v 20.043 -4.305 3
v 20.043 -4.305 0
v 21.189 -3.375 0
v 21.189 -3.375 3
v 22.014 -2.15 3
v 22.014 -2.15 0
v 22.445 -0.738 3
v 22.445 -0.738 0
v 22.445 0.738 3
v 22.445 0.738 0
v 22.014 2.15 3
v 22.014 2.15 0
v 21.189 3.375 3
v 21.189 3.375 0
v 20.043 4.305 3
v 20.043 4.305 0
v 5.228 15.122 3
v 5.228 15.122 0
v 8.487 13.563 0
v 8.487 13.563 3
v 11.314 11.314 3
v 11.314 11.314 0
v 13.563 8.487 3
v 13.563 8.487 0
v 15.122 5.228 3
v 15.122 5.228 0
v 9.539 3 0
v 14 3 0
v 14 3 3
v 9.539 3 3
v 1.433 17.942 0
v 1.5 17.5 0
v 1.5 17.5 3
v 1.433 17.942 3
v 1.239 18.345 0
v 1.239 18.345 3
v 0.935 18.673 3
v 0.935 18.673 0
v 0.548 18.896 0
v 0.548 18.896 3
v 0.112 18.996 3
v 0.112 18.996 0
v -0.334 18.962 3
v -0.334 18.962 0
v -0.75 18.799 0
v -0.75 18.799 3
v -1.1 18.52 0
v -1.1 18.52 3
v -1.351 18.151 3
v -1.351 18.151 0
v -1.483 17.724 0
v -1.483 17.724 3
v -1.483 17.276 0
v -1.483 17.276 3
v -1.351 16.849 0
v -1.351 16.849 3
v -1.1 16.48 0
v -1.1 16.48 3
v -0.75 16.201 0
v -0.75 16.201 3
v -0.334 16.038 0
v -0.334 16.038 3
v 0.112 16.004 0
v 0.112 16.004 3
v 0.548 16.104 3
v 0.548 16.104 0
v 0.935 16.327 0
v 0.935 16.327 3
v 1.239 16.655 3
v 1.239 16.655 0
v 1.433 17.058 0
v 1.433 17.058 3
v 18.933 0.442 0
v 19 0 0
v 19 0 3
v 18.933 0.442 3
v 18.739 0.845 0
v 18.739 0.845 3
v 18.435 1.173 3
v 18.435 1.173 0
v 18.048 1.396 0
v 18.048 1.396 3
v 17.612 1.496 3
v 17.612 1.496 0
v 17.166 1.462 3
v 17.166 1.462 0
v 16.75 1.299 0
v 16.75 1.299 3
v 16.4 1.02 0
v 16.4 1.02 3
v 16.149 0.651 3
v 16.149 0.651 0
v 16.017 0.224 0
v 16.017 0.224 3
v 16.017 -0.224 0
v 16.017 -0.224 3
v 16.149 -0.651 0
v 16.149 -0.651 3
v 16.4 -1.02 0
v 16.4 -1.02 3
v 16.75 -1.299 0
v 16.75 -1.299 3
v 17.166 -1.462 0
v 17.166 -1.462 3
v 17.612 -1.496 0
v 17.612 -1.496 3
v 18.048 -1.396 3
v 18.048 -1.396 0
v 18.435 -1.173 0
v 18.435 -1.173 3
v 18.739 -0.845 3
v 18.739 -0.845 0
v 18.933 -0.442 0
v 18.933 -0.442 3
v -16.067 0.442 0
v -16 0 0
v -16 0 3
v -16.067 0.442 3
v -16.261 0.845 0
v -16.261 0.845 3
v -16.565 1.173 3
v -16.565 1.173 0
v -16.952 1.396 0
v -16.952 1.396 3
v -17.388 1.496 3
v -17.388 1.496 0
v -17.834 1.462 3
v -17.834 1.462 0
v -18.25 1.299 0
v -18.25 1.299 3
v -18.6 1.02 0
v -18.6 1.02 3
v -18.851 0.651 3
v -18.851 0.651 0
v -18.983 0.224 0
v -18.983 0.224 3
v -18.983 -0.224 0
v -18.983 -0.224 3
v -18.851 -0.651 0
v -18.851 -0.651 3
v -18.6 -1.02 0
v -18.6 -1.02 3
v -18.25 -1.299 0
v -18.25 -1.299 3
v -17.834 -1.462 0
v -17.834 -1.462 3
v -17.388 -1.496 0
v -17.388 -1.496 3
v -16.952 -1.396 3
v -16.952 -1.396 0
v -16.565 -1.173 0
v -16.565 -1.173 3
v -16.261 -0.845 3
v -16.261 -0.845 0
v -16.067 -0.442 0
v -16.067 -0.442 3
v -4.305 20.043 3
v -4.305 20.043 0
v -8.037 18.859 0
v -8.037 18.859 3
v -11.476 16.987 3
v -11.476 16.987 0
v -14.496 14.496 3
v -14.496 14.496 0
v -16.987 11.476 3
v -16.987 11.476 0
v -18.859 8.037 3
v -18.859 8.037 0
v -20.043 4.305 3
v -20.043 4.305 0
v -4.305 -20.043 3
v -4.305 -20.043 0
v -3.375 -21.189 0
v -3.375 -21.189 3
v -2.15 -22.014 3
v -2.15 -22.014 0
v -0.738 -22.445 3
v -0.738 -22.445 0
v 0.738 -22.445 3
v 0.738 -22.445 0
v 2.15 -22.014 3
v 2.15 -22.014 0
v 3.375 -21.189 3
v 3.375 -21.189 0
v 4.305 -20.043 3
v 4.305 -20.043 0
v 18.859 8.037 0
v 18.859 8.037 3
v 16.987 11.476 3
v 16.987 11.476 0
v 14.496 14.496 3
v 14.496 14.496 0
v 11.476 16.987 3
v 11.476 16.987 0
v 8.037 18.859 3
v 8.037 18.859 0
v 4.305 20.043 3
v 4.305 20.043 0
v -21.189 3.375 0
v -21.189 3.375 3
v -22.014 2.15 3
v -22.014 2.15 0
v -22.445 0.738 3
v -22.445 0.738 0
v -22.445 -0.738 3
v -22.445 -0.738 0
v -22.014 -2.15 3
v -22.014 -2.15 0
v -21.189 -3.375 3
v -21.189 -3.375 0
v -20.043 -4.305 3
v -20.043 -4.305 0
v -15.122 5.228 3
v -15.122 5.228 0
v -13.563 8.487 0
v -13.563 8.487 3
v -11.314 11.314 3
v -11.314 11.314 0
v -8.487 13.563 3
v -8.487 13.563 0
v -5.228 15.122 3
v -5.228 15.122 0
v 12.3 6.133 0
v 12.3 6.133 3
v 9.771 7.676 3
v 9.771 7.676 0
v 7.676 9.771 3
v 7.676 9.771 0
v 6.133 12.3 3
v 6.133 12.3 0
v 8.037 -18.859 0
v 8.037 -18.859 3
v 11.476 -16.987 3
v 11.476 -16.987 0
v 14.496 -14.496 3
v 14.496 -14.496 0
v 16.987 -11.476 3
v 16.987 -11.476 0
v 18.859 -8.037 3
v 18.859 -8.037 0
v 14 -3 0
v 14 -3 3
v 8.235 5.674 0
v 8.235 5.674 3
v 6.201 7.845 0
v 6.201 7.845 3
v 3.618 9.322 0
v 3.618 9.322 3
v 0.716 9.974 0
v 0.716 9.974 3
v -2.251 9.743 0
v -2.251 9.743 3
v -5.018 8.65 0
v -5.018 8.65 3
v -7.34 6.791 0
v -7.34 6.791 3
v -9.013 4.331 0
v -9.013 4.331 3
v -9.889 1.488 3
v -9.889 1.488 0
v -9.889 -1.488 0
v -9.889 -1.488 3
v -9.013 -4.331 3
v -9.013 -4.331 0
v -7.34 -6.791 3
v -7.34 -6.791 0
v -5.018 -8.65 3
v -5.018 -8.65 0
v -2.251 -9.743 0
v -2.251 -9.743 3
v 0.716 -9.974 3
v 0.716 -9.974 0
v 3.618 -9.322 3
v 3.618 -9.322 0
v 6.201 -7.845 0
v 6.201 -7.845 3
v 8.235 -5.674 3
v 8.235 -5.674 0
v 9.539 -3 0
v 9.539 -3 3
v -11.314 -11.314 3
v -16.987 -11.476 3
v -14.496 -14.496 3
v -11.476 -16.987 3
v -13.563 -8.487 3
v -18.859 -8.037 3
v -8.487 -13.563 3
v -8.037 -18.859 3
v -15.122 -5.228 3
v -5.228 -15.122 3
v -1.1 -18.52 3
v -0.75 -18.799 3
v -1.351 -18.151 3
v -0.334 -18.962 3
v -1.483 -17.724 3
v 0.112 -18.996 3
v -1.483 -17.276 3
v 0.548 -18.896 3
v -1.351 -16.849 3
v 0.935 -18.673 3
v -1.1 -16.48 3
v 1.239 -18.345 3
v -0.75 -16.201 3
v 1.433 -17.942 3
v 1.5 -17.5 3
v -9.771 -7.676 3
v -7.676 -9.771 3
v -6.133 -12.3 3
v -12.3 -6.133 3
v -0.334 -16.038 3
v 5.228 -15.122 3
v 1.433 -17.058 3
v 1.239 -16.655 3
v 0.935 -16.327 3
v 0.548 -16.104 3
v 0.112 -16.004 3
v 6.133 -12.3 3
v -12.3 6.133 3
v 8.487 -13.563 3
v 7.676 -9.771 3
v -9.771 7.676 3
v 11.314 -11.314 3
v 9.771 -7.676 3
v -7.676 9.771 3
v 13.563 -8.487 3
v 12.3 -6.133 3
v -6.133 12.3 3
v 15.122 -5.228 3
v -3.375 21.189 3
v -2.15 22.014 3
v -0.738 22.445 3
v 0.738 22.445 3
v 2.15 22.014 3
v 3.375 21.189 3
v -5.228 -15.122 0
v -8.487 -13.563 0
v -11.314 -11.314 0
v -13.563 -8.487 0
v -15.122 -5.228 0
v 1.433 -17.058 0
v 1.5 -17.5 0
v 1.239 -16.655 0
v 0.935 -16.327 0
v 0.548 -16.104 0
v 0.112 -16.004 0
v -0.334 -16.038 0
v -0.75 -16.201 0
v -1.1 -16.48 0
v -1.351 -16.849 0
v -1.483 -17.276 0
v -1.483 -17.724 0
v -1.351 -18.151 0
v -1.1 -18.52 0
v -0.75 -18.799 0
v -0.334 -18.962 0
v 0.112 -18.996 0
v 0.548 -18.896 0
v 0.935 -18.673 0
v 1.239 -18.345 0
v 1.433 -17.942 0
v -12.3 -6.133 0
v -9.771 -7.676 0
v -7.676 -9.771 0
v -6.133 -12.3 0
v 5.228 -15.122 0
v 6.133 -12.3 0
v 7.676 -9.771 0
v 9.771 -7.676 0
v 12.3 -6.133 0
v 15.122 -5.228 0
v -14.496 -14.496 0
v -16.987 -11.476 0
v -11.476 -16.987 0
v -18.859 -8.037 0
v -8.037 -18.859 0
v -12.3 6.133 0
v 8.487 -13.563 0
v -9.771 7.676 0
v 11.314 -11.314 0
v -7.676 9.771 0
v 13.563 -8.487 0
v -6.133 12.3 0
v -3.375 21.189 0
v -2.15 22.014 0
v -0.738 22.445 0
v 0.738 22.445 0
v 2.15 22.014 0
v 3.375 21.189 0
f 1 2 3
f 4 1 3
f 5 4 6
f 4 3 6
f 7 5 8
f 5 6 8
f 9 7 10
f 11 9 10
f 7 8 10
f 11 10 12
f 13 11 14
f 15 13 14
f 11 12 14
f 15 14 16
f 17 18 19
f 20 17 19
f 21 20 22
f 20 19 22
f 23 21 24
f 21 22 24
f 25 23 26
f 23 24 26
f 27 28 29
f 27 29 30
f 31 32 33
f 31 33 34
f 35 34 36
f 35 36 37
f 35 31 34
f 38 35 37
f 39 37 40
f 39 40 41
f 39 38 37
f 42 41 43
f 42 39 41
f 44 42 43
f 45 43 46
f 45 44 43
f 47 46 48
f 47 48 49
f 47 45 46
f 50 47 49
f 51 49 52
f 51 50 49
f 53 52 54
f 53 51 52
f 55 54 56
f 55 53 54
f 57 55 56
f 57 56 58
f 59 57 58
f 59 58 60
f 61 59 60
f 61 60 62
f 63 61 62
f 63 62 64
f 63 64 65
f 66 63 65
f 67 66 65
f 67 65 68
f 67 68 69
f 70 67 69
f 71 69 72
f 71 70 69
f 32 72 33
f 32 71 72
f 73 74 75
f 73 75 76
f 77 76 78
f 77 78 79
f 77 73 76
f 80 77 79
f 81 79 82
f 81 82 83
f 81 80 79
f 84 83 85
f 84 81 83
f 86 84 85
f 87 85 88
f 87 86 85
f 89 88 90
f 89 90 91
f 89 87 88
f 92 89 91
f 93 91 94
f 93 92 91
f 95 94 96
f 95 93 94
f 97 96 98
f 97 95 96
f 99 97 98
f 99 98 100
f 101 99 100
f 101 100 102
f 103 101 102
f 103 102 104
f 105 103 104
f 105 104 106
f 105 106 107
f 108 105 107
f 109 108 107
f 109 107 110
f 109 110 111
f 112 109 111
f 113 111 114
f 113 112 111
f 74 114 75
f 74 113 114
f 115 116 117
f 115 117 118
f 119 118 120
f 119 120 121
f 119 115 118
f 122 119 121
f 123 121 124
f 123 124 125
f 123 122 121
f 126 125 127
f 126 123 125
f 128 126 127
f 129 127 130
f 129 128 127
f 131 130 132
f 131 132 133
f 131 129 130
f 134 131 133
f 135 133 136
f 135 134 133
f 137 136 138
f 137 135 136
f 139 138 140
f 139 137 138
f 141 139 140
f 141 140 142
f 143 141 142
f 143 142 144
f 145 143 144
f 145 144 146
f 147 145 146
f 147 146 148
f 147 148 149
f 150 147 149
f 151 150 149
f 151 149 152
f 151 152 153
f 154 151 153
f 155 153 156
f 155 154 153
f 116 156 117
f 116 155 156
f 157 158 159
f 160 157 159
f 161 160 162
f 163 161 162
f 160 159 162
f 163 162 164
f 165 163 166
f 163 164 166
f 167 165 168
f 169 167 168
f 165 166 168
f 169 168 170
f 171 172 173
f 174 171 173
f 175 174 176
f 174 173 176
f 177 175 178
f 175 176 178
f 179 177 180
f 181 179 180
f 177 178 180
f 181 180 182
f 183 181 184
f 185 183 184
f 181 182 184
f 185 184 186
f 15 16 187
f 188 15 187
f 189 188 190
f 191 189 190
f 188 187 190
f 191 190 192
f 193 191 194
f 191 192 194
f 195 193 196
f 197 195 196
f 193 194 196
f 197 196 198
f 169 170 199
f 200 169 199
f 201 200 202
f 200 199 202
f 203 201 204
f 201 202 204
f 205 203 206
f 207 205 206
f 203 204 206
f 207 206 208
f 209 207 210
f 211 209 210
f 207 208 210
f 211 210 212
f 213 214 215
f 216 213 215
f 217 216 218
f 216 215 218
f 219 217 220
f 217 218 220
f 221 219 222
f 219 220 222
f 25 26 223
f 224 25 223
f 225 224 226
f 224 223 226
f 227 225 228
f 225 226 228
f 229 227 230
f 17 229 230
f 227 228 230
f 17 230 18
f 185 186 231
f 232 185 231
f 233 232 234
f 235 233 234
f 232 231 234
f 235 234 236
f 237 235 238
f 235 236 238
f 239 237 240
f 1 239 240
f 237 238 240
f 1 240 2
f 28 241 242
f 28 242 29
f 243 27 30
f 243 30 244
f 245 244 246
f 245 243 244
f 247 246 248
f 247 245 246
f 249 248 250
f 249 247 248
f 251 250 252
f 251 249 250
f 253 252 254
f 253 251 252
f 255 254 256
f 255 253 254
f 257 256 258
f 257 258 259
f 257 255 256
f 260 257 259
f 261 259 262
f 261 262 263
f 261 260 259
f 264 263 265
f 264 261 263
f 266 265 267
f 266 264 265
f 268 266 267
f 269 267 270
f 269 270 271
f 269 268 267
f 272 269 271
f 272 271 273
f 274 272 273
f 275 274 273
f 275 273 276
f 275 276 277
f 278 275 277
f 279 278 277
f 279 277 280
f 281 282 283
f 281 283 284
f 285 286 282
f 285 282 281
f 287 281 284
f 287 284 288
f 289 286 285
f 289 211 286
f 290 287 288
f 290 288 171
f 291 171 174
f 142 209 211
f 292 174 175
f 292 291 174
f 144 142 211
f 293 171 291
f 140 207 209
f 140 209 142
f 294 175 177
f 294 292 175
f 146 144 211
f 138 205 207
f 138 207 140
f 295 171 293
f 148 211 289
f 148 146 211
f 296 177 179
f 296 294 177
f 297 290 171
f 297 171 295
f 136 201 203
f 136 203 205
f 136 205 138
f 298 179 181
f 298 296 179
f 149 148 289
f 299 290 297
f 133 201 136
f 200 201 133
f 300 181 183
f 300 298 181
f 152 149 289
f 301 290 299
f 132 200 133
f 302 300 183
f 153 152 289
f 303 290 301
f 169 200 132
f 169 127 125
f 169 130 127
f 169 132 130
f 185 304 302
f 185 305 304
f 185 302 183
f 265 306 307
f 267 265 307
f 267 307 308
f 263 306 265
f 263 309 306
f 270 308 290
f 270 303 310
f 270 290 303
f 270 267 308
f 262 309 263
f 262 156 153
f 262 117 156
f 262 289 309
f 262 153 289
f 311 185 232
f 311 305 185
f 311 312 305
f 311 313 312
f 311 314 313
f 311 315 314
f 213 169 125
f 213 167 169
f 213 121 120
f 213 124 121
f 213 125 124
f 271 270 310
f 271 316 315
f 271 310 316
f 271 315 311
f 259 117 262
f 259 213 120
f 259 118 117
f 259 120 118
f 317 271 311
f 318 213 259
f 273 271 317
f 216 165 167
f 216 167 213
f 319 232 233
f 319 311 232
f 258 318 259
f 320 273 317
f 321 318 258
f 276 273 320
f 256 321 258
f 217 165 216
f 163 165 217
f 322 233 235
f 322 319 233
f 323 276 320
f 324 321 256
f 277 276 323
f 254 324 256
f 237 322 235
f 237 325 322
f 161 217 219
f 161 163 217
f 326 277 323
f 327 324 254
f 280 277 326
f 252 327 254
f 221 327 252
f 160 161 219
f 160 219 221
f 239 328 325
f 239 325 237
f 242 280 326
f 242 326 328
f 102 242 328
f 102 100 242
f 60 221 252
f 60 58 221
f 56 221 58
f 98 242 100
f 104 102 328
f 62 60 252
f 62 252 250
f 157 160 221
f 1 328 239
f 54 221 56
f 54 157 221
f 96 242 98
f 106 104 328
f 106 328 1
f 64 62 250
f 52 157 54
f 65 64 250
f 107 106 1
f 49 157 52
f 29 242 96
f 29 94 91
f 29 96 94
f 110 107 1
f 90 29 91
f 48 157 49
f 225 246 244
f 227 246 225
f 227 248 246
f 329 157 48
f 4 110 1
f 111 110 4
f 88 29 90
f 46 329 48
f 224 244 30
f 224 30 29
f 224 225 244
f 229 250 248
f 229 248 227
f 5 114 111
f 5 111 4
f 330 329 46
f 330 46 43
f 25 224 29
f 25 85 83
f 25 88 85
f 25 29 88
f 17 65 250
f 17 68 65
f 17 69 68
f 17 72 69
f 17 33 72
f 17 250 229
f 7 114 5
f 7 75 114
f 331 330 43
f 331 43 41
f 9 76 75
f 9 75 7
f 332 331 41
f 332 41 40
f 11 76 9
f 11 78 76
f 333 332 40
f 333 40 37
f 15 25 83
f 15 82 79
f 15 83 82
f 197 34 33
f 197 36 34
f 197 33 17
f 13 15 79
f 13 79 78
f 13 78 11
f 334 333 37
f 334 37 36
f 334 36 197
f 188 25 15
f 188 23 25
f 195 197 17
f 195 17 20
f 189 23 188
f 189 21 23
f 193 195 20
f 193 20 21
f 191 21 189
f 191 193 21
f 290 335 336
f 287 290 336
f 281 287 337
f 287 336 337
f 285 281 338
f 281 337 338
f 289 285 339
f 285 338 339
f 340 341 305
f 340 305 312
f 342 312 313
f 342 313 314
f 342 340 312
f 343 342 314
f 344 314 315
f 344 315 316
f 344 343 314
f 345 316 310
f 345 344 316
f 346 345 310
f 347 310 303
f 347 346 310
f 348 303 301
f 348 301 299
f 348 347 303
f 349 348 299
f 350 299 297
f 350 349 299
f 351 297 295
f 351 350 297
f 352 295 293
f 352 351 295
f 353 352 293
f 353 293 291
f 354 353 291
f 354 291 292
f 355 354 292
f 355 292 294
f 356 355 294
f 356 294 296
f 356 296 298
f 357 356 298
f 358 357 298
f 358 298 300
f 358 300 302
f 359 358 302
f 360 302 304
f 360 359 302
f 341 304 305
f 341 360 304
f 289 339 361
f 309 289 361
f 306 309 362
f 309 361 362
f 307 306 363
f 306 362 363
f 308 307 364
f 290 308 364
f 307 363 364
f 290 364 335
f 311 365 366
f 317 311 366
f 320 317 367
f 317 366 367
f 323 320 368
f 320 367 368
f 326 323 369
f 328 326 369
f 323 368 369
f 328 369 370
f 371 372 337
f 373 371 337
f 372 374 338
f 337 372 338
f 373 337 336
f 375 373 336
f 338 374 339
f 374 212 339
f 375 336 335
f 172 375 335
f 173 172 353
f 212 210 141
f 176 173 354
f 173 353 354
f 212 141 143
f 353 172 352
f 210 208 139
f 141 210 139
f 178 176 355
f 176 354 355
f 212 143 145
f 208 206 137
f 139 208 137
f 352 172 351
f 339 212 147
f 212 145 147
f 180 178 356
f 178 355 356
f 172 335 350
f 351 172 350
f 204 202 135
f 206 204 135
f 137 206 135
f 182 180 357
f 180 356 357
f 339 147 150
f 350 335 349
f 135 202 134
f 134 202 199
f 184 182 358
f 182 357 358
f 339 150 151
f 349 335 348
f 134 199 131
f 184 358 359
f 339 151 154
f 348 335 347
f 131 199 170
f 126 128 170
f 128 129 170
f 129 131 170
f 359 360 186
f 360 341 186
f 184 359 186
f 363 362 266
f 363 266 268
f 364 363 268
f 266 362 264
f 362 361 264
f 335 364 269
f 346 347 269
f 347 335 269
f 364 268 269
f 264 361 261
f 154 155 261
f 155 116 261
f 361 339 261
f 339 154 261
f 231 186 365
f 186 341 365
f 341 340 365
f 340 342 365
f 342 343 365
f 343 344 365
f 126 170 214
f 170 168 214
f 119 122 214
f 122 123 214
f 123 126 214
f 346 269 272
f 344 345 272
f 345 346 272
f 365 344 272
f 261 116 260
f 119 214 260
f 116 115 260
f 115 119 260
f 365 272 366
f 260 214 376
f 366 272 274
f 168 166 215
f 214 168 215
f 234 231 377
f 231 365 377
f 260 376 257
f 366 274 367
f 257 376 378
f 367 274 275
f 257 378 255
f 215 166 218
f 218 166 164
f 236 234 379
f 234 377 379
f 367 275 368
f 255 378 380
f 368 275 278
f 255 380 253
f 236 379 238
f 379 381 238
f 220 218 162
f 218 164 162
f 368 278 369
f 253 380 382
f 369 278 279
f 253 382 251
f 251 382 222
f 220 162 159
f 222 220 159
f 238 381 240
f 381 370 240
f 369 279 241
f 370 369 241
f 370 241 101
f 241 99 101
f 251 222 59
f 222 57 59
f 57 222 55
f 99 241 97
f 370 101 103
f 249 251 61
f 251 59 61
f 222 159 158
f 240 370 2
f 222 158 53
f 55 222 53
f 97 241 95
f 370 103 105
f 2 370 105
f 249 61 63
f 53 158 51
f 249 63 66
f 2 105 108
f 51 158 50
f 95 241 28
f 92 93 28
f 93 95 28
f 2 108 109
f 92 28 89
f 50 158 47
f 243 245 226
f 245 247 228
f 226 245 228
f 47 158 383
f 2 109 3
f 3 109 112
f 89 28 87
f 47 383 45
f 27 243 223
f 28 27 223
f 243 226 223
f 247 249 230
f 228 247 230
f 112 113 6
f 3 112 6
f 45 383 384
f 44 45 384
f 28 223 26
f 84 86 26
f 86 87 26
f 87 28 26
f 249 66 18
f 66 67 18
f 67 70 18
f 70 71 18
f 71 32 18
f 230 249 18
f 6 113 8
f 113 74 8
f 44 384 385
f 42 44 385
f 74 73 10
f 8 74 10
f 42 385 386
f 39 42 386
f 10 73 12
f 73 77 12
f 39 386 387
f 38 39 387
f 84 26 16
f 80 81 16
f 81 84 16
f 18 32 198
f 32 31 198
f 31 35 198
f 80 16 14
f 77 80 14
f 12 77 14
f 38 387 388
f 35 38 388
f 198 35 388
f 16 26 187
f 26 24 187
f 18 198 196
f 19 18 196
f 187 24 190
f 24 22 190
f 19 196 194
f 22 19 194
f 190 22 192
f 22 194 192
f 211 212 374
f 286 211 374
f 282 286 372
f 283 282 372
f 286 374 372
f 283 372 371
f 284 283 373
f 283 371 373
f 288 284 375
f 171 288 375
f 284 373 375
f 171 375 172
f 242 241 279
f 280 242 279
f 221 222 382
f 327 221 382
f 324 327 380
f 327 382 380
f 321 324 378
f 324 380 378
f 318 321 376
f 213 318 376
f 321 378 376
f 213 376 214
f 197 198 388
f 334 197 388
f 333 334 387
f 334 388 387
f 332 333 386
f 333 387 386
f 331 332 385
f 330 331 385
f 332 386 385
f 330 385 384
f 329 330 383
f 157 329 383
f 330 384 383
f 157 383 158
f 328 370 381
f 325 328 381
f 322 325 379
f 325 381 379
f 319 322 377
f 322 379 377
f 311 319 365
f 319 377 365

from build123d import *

# Parameters (mm, degrees)
CROQUIS2_R              = 1.5
CROQUIS2_R_2            = 10
SALIENTE_EXTRUIR2_DEPTH = 3
CROQUIS4_W              = 8
CROQUIS4_H              = 6
CORTAR_EXTRUIR1_DEPTH   = 32.960913629


with BuildPart() as part:
    # Croquis2 → Saliente-Extruir2 (new body)
    with BuildSketch(Plane.XY):
        with BuildLine():
            ThreePointArc((-4.305099018, -20.042857143), (0, -22.5), (4.305099018, -20.042857143))
            ThreePointArc((4.305099018, -20.042857143), (14.495689014, -14.495689014), (20.042857143, -4.305099018))
            ThreePointArc((20.042857143, -4.305099018), (22.5, 0), (20.042857143, 4.305099018))
            ThreePointArc((20.042857143, 4.305099018), (14.495689014, 14.495689014), (4.305099018, 20.042857143))
            ThreePointArc((4.305099018, 20.042857143), (0, 22.5), (-4.305099018, 20.042857143))
            ThreePointArc((-4.305099018, 20.042857143), (-14.495689014, 14.495689014), (-20.042857143, 4.305099018))
            ThreePointArc((-20.042857143, 4.305099018), (-22.5, 0), (-20.042857143, -4.305099018))
            ThreePointArc((-20.042857143, -4.305099018), (-14.495689014, -14.495689014), (-4.305099018, -20.042857143))
        make_face()
        with BuildLine():
            ThreePointArc((-15.121652909, -5.228347091), (-8.661165235, -8.661165235), (-5.228347091, -15.121652909))
            ThreePointArc((-5.228347091, -15.121652909), (-11.313708499, -11.313708499), (-15.121652909, -5.228347091))
        make_face(mode=Mode.SUBTRACT)
        with Locations((0, -17.5)):
            Circle(CROQUIS2_R, mode=Mode.SUBTRACT)
        with BuildLine():
            ThreePointArc((15.121652909, -5.228347091), (11.313708499, -11.313708499), (5.228347091, -15.121652909))
            ThreePointArc((5.228347091, -15.121652909), (8.661165235, -8.661165235), (15.121652909, -5.228347091))
        make_face(mode=Mode.SUBTRACT)
        with Locations((-17.5, 0)):
            Circle(CROQUIS2_R, mode=Mode.SUBTRACT)
        with BuildLine():
            ThreePointArc((-15.121652909, 5.228347091), (-11.313708499, 11.313708499), (-5.228347091, 15.121652909))
            ThreePointArc((-5.228347091, 15.121652909), (-8.661165235, 8.661165235), (-15.121652909, 5.228347091))
        make_face(mode=Mode.SUBTRACT)
        Circle(CROQUIS2_R_2, mode=Mode.SUBTRACT)
        with Locations((17.5, 0)):
            Circle(CROQUIS2_R, mode=Mode.SUBTRACT)
        with Locations((0, 17.5)):
            Circle(CROQUIS2_R, mode=Mode.SUBTRACT)
        with BuildLine():
            ThreePointArc((5.228347091, 15.121652909), (11.313708499, 11.313708499), (15.121652909, 5.228347091))
            ThreePointArc((15.121652909, 5.228347091), (8.661165235, 8.661165235), (5.228347091, 15.121652909))
        make_face(mode=Mode.SUBTRACT)
    extrude(amount=SALIENTE_EXTRUIR2_DEPTH)

    # Croquis4 → Cortar-Extruir1 (cut, through all)
    with BuildSketch(Plane(origin=(0, 0, 0), x_dir=(-1, 0, 0), z_dir=(0, 0, -1))):
        with Locations((-10, 0)):
            Rectangle(CROQUIS4_W, CROQUIS4_H)
    extrude(amount=-CORTAR_EXTRUIR1_DEPTH, mode=Mode.SUBTRACT)


solid = part.part
